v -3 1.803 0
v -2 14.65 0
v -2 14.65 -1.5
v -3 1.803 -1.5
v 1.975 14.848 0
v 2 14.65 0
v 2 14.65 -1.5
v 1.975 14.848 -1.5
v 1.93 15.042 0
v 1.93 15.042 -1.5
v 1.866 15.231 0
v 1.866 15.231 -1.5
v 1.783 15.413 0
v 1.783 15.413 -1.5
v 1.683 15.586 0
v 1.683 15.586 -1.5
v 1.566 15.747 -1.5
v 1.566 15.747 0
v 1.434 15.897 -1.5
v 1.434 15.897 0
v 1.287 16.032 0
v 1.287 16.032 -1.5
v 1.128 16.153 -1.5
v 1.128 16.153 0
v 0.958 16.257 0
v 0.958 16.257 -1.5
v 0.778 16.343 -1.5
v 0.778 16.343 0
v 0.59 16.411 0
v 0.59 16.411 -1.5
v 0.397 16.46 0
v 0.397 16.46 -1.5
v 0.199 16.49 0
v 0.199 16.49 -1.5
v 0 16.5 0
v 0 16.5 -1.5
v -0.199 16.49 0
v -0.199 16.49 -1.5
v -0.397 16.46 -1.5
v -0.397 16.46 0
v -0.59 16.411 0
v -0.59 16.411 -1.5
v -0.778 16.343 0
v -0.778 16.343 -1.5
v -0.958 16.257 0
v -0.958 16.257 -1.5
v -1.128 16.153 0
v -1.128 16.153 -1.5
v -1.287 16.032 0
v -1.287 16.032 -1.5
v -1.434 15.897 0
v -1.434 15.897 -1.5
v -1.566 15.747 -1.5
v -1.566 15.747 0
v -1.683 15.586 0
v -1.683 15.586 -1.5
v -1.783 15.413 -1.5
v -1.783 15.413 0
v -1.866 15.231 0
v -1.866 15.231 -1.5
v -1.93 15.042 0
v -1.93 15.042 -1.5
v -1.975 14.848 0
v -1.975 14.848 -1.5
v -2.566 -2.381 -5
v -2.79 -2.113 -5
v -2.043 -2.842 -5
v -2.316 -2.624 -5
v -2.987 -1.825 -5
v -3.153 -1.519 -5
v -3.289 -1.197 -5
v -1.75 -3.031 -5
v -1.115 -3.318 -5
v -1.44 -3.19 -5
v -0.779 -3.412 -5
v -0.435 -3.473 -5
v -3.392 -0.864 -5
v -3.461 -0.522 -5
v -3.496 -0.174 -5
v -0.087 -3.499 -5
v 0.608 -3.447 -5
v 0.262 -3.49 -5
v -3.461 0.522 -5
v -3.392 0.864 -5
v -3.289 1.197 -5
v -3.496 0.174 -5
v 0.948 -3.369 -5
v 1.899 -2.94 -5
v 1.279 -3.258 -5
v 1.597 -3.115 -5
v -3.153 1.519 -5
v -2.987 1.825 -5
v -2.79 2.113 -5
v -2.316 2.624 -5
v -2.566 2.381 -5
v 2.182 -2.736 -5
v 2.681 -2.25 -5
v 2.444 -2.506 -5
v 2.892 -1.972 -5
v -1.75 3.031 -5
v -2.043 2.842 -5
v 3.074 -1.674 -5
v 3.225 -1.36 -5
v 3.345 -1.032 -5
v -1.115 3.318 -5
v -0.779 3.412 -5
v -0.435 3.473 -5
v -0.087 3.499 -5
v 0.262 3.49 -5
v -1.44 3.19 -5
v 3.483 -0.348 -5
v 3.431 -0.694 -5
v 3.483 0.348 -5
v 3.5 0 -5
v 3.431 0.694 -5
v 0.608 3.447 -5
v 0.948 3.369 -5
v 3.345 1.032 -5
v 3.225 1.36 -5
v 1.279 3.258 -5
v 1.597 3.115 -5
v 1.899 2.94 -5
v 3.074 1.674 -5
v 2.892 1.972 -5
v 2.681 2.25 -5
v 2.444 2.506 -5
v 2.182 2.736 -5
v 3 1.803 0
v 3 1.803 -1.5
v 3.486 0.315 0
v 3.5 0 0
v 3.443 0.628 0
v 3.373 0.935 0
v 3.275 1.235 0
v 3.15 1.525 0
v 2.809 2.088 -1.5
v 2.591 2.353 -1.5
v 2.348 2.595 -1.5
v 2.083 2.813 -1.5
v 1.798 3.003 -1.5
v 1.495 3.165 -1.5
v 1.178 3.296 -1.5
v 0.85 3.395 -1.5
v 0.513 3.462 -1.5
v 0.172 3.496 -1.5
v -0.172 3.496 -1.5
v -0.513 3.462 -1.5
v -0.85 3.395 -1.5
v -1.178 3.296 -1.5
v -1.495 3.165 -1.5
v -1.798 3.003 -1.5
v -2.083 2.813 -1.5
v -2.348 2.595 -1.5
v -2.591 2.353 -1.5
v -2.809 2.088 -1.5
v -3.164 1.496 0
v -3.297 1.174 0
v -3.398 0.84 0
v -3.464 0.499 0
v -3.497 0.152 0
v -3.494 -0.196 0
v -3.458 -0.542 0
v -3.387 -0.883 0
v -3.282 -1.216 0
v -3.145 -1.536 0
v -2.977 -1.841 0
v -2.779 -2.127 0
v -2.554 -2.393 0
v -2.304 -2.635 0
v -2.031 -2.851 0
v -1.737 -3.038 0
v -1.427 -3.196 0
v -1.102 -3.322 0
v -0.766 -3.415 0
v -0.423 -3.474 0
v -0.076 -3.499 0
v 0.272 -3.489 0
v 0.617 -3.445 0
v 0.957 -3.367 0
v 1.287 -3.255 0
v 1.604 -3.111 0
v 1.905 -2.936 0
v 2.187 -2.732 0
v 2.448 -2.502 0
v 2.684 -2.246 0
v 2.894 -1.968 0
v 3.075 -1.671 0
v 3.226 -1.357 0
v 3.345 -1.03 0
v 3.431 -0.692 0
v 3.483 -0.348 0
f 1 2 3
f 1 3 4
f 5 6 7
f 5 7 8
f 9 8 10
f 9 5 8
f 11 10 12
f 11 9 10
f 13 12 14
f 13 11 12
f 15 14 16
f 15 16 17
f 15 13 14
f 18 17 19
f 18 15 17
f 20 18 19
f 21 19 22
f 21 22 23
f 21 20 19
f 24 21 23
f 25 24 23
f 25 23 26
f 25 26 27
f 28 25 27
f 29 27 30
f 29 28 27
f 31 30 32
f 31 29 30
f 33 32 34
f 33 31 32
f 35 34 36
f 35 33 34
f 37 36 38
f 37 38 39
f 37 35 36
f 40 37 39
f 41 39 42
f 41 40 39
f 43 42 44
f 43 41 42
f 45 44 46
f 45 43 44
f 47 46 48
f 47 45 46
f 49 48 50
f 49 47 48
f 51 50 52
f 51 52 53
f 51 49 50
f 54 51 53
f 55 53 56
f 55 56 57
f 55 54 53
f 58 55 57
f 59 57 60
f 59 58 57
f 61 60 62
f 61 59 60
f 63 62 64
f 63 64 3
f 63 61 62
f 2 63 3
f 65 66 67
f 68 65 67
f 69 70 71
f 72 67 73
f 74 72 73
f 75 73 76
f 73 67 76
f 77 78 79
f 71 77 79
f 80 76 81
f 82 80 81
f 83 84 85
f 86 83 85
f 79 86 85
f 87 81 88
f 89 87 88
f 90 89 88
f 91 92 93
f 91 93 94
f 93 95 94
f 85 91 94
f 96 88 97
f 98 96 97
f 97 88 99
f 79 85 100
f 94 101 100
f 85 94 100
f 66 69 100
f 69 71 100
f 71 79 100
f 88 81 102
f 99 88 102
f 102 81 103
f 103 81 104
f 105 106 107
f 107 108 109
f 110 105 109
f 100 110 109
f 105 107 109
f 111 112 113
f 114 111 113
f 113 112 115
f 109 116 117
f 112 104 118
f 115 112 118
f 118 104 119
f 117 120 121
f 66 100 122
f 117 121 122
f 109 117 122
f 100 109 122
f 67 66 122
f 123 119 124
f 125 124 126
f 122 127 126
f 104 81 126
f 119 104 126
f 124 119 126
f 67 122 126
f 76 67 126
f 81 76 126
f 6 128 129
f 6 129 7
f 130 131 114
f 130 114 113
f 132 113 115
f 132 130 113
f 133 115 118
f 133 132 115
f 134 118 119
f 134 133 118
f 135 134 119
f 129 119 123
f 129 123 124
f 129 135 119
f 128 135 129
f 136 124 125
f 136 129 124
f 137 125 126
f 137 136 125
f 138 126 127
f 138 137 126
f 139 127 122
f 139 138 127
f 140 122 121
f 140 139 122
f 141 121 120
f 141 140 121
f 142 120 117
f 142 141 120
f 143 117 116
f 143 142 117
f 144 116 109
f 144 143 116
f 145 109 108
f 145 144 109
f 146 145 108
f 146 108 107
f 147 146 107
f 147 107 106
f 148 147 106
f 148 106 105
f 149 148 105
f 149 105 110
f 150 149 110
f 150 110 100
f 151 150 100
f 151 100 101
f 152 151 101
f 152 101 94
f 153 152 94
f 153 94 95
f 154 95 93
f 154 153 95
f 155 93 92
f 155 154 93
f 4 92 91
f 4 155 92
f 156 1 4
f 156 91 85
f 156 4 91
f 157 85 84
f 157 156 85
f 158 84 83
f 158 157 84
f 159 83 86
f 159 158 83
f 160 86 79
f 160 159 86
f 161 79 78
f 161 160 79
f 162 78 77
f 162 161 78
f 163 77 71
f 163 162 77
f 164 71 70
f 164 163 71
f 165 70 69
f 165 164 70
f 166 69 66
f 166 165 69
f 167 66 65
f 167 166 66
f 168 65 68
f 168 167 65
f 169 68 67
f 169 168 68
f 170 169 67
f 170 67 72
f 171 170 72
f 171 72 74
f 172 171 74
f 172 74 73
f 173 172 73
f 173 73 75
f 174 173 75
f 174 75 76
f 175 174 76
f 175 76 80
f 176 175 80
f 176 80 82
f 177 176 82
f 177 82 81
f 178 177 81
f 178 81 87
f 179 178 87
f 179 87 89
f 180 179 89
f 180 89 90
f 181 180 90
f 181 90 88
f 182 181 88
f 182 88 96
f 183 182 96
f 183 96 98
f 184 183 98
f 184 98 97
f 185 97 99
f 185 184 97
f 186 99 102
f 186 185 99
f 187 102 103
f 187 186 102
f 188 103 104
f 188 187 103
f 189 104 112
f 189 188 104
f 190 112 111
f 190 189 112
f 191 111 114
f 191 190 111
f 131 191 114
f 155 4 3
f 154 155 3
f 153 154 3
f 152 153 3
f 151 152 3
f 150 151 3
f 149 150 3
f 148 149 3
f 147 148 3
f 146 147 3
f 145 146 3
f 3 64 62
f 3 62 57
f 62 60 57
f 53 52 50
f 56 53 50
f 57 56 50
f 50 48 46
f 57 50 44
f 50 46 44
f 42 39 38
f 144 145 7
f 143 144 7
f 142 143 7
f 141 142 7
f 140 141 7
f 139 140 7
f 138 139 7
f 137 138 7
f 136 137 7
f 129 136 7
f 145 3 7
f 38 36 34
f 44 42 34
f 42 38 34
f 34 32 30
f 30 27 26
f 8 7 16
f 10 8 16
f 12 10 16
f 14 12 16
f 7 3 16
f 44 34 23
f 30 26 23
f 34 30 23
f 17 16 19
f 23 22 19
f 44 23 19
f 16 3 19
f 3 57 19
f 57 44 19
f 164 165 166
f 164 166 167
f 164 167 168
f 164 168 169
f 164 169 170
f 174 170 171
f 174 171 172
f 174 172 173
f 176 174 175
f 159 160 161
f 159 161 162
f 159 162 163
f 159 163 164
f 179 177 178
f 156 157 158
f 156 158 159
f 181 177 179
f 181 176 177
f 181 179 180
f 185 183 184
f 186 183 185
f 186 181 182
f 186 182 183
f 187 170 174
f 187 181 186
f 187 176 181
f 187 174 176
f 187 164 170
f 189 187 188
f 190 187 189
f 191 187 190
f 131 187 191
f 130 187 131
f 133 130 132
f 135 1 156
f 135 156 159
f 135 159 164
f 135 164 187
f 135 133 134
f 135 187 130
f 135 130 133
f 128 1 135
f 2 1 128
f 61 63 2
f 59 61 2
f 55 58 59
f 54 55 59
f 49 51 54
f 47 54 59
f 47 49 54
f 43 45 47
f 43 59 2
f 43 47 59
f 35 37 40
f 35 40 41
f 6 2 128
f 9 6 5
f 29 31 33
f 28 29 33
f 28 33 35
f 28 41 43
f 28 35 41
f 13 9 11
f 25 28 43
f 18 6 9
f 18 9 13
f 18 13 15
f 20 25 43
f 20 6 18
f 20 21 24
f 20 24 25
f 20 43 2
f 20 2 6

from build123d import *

# Parameters (mm, degrees)
F0_R     = 3.5
F1_DEPTH = 5
F3_DEPTH = 1.5


with BuildPart() as f1:
    # F0 (on Top) → F1 (new body)
    with BuildSketch(Plane.XY):
        Circle(F0_R)
    extrude(amount=-F1_DEPTH)

    # F2 (on Top) → F3 (join)
    with BuildSketch(Plane.XY):
        with BuildLine():
            Line((3, 1.802776), (2, 14.64963))
            ThreePointArc((2, 14.64963), (0, 16.5), (-2, 14.64963))
            Line((-2, 14.64963), (-3, 1.802776))
            ThreePointArc((-3, 1.802776), (0, 3.5), (3, 1.802776))
        make_face()
    extrude(amount=-F3_DEPTH)


solid = f1.part
